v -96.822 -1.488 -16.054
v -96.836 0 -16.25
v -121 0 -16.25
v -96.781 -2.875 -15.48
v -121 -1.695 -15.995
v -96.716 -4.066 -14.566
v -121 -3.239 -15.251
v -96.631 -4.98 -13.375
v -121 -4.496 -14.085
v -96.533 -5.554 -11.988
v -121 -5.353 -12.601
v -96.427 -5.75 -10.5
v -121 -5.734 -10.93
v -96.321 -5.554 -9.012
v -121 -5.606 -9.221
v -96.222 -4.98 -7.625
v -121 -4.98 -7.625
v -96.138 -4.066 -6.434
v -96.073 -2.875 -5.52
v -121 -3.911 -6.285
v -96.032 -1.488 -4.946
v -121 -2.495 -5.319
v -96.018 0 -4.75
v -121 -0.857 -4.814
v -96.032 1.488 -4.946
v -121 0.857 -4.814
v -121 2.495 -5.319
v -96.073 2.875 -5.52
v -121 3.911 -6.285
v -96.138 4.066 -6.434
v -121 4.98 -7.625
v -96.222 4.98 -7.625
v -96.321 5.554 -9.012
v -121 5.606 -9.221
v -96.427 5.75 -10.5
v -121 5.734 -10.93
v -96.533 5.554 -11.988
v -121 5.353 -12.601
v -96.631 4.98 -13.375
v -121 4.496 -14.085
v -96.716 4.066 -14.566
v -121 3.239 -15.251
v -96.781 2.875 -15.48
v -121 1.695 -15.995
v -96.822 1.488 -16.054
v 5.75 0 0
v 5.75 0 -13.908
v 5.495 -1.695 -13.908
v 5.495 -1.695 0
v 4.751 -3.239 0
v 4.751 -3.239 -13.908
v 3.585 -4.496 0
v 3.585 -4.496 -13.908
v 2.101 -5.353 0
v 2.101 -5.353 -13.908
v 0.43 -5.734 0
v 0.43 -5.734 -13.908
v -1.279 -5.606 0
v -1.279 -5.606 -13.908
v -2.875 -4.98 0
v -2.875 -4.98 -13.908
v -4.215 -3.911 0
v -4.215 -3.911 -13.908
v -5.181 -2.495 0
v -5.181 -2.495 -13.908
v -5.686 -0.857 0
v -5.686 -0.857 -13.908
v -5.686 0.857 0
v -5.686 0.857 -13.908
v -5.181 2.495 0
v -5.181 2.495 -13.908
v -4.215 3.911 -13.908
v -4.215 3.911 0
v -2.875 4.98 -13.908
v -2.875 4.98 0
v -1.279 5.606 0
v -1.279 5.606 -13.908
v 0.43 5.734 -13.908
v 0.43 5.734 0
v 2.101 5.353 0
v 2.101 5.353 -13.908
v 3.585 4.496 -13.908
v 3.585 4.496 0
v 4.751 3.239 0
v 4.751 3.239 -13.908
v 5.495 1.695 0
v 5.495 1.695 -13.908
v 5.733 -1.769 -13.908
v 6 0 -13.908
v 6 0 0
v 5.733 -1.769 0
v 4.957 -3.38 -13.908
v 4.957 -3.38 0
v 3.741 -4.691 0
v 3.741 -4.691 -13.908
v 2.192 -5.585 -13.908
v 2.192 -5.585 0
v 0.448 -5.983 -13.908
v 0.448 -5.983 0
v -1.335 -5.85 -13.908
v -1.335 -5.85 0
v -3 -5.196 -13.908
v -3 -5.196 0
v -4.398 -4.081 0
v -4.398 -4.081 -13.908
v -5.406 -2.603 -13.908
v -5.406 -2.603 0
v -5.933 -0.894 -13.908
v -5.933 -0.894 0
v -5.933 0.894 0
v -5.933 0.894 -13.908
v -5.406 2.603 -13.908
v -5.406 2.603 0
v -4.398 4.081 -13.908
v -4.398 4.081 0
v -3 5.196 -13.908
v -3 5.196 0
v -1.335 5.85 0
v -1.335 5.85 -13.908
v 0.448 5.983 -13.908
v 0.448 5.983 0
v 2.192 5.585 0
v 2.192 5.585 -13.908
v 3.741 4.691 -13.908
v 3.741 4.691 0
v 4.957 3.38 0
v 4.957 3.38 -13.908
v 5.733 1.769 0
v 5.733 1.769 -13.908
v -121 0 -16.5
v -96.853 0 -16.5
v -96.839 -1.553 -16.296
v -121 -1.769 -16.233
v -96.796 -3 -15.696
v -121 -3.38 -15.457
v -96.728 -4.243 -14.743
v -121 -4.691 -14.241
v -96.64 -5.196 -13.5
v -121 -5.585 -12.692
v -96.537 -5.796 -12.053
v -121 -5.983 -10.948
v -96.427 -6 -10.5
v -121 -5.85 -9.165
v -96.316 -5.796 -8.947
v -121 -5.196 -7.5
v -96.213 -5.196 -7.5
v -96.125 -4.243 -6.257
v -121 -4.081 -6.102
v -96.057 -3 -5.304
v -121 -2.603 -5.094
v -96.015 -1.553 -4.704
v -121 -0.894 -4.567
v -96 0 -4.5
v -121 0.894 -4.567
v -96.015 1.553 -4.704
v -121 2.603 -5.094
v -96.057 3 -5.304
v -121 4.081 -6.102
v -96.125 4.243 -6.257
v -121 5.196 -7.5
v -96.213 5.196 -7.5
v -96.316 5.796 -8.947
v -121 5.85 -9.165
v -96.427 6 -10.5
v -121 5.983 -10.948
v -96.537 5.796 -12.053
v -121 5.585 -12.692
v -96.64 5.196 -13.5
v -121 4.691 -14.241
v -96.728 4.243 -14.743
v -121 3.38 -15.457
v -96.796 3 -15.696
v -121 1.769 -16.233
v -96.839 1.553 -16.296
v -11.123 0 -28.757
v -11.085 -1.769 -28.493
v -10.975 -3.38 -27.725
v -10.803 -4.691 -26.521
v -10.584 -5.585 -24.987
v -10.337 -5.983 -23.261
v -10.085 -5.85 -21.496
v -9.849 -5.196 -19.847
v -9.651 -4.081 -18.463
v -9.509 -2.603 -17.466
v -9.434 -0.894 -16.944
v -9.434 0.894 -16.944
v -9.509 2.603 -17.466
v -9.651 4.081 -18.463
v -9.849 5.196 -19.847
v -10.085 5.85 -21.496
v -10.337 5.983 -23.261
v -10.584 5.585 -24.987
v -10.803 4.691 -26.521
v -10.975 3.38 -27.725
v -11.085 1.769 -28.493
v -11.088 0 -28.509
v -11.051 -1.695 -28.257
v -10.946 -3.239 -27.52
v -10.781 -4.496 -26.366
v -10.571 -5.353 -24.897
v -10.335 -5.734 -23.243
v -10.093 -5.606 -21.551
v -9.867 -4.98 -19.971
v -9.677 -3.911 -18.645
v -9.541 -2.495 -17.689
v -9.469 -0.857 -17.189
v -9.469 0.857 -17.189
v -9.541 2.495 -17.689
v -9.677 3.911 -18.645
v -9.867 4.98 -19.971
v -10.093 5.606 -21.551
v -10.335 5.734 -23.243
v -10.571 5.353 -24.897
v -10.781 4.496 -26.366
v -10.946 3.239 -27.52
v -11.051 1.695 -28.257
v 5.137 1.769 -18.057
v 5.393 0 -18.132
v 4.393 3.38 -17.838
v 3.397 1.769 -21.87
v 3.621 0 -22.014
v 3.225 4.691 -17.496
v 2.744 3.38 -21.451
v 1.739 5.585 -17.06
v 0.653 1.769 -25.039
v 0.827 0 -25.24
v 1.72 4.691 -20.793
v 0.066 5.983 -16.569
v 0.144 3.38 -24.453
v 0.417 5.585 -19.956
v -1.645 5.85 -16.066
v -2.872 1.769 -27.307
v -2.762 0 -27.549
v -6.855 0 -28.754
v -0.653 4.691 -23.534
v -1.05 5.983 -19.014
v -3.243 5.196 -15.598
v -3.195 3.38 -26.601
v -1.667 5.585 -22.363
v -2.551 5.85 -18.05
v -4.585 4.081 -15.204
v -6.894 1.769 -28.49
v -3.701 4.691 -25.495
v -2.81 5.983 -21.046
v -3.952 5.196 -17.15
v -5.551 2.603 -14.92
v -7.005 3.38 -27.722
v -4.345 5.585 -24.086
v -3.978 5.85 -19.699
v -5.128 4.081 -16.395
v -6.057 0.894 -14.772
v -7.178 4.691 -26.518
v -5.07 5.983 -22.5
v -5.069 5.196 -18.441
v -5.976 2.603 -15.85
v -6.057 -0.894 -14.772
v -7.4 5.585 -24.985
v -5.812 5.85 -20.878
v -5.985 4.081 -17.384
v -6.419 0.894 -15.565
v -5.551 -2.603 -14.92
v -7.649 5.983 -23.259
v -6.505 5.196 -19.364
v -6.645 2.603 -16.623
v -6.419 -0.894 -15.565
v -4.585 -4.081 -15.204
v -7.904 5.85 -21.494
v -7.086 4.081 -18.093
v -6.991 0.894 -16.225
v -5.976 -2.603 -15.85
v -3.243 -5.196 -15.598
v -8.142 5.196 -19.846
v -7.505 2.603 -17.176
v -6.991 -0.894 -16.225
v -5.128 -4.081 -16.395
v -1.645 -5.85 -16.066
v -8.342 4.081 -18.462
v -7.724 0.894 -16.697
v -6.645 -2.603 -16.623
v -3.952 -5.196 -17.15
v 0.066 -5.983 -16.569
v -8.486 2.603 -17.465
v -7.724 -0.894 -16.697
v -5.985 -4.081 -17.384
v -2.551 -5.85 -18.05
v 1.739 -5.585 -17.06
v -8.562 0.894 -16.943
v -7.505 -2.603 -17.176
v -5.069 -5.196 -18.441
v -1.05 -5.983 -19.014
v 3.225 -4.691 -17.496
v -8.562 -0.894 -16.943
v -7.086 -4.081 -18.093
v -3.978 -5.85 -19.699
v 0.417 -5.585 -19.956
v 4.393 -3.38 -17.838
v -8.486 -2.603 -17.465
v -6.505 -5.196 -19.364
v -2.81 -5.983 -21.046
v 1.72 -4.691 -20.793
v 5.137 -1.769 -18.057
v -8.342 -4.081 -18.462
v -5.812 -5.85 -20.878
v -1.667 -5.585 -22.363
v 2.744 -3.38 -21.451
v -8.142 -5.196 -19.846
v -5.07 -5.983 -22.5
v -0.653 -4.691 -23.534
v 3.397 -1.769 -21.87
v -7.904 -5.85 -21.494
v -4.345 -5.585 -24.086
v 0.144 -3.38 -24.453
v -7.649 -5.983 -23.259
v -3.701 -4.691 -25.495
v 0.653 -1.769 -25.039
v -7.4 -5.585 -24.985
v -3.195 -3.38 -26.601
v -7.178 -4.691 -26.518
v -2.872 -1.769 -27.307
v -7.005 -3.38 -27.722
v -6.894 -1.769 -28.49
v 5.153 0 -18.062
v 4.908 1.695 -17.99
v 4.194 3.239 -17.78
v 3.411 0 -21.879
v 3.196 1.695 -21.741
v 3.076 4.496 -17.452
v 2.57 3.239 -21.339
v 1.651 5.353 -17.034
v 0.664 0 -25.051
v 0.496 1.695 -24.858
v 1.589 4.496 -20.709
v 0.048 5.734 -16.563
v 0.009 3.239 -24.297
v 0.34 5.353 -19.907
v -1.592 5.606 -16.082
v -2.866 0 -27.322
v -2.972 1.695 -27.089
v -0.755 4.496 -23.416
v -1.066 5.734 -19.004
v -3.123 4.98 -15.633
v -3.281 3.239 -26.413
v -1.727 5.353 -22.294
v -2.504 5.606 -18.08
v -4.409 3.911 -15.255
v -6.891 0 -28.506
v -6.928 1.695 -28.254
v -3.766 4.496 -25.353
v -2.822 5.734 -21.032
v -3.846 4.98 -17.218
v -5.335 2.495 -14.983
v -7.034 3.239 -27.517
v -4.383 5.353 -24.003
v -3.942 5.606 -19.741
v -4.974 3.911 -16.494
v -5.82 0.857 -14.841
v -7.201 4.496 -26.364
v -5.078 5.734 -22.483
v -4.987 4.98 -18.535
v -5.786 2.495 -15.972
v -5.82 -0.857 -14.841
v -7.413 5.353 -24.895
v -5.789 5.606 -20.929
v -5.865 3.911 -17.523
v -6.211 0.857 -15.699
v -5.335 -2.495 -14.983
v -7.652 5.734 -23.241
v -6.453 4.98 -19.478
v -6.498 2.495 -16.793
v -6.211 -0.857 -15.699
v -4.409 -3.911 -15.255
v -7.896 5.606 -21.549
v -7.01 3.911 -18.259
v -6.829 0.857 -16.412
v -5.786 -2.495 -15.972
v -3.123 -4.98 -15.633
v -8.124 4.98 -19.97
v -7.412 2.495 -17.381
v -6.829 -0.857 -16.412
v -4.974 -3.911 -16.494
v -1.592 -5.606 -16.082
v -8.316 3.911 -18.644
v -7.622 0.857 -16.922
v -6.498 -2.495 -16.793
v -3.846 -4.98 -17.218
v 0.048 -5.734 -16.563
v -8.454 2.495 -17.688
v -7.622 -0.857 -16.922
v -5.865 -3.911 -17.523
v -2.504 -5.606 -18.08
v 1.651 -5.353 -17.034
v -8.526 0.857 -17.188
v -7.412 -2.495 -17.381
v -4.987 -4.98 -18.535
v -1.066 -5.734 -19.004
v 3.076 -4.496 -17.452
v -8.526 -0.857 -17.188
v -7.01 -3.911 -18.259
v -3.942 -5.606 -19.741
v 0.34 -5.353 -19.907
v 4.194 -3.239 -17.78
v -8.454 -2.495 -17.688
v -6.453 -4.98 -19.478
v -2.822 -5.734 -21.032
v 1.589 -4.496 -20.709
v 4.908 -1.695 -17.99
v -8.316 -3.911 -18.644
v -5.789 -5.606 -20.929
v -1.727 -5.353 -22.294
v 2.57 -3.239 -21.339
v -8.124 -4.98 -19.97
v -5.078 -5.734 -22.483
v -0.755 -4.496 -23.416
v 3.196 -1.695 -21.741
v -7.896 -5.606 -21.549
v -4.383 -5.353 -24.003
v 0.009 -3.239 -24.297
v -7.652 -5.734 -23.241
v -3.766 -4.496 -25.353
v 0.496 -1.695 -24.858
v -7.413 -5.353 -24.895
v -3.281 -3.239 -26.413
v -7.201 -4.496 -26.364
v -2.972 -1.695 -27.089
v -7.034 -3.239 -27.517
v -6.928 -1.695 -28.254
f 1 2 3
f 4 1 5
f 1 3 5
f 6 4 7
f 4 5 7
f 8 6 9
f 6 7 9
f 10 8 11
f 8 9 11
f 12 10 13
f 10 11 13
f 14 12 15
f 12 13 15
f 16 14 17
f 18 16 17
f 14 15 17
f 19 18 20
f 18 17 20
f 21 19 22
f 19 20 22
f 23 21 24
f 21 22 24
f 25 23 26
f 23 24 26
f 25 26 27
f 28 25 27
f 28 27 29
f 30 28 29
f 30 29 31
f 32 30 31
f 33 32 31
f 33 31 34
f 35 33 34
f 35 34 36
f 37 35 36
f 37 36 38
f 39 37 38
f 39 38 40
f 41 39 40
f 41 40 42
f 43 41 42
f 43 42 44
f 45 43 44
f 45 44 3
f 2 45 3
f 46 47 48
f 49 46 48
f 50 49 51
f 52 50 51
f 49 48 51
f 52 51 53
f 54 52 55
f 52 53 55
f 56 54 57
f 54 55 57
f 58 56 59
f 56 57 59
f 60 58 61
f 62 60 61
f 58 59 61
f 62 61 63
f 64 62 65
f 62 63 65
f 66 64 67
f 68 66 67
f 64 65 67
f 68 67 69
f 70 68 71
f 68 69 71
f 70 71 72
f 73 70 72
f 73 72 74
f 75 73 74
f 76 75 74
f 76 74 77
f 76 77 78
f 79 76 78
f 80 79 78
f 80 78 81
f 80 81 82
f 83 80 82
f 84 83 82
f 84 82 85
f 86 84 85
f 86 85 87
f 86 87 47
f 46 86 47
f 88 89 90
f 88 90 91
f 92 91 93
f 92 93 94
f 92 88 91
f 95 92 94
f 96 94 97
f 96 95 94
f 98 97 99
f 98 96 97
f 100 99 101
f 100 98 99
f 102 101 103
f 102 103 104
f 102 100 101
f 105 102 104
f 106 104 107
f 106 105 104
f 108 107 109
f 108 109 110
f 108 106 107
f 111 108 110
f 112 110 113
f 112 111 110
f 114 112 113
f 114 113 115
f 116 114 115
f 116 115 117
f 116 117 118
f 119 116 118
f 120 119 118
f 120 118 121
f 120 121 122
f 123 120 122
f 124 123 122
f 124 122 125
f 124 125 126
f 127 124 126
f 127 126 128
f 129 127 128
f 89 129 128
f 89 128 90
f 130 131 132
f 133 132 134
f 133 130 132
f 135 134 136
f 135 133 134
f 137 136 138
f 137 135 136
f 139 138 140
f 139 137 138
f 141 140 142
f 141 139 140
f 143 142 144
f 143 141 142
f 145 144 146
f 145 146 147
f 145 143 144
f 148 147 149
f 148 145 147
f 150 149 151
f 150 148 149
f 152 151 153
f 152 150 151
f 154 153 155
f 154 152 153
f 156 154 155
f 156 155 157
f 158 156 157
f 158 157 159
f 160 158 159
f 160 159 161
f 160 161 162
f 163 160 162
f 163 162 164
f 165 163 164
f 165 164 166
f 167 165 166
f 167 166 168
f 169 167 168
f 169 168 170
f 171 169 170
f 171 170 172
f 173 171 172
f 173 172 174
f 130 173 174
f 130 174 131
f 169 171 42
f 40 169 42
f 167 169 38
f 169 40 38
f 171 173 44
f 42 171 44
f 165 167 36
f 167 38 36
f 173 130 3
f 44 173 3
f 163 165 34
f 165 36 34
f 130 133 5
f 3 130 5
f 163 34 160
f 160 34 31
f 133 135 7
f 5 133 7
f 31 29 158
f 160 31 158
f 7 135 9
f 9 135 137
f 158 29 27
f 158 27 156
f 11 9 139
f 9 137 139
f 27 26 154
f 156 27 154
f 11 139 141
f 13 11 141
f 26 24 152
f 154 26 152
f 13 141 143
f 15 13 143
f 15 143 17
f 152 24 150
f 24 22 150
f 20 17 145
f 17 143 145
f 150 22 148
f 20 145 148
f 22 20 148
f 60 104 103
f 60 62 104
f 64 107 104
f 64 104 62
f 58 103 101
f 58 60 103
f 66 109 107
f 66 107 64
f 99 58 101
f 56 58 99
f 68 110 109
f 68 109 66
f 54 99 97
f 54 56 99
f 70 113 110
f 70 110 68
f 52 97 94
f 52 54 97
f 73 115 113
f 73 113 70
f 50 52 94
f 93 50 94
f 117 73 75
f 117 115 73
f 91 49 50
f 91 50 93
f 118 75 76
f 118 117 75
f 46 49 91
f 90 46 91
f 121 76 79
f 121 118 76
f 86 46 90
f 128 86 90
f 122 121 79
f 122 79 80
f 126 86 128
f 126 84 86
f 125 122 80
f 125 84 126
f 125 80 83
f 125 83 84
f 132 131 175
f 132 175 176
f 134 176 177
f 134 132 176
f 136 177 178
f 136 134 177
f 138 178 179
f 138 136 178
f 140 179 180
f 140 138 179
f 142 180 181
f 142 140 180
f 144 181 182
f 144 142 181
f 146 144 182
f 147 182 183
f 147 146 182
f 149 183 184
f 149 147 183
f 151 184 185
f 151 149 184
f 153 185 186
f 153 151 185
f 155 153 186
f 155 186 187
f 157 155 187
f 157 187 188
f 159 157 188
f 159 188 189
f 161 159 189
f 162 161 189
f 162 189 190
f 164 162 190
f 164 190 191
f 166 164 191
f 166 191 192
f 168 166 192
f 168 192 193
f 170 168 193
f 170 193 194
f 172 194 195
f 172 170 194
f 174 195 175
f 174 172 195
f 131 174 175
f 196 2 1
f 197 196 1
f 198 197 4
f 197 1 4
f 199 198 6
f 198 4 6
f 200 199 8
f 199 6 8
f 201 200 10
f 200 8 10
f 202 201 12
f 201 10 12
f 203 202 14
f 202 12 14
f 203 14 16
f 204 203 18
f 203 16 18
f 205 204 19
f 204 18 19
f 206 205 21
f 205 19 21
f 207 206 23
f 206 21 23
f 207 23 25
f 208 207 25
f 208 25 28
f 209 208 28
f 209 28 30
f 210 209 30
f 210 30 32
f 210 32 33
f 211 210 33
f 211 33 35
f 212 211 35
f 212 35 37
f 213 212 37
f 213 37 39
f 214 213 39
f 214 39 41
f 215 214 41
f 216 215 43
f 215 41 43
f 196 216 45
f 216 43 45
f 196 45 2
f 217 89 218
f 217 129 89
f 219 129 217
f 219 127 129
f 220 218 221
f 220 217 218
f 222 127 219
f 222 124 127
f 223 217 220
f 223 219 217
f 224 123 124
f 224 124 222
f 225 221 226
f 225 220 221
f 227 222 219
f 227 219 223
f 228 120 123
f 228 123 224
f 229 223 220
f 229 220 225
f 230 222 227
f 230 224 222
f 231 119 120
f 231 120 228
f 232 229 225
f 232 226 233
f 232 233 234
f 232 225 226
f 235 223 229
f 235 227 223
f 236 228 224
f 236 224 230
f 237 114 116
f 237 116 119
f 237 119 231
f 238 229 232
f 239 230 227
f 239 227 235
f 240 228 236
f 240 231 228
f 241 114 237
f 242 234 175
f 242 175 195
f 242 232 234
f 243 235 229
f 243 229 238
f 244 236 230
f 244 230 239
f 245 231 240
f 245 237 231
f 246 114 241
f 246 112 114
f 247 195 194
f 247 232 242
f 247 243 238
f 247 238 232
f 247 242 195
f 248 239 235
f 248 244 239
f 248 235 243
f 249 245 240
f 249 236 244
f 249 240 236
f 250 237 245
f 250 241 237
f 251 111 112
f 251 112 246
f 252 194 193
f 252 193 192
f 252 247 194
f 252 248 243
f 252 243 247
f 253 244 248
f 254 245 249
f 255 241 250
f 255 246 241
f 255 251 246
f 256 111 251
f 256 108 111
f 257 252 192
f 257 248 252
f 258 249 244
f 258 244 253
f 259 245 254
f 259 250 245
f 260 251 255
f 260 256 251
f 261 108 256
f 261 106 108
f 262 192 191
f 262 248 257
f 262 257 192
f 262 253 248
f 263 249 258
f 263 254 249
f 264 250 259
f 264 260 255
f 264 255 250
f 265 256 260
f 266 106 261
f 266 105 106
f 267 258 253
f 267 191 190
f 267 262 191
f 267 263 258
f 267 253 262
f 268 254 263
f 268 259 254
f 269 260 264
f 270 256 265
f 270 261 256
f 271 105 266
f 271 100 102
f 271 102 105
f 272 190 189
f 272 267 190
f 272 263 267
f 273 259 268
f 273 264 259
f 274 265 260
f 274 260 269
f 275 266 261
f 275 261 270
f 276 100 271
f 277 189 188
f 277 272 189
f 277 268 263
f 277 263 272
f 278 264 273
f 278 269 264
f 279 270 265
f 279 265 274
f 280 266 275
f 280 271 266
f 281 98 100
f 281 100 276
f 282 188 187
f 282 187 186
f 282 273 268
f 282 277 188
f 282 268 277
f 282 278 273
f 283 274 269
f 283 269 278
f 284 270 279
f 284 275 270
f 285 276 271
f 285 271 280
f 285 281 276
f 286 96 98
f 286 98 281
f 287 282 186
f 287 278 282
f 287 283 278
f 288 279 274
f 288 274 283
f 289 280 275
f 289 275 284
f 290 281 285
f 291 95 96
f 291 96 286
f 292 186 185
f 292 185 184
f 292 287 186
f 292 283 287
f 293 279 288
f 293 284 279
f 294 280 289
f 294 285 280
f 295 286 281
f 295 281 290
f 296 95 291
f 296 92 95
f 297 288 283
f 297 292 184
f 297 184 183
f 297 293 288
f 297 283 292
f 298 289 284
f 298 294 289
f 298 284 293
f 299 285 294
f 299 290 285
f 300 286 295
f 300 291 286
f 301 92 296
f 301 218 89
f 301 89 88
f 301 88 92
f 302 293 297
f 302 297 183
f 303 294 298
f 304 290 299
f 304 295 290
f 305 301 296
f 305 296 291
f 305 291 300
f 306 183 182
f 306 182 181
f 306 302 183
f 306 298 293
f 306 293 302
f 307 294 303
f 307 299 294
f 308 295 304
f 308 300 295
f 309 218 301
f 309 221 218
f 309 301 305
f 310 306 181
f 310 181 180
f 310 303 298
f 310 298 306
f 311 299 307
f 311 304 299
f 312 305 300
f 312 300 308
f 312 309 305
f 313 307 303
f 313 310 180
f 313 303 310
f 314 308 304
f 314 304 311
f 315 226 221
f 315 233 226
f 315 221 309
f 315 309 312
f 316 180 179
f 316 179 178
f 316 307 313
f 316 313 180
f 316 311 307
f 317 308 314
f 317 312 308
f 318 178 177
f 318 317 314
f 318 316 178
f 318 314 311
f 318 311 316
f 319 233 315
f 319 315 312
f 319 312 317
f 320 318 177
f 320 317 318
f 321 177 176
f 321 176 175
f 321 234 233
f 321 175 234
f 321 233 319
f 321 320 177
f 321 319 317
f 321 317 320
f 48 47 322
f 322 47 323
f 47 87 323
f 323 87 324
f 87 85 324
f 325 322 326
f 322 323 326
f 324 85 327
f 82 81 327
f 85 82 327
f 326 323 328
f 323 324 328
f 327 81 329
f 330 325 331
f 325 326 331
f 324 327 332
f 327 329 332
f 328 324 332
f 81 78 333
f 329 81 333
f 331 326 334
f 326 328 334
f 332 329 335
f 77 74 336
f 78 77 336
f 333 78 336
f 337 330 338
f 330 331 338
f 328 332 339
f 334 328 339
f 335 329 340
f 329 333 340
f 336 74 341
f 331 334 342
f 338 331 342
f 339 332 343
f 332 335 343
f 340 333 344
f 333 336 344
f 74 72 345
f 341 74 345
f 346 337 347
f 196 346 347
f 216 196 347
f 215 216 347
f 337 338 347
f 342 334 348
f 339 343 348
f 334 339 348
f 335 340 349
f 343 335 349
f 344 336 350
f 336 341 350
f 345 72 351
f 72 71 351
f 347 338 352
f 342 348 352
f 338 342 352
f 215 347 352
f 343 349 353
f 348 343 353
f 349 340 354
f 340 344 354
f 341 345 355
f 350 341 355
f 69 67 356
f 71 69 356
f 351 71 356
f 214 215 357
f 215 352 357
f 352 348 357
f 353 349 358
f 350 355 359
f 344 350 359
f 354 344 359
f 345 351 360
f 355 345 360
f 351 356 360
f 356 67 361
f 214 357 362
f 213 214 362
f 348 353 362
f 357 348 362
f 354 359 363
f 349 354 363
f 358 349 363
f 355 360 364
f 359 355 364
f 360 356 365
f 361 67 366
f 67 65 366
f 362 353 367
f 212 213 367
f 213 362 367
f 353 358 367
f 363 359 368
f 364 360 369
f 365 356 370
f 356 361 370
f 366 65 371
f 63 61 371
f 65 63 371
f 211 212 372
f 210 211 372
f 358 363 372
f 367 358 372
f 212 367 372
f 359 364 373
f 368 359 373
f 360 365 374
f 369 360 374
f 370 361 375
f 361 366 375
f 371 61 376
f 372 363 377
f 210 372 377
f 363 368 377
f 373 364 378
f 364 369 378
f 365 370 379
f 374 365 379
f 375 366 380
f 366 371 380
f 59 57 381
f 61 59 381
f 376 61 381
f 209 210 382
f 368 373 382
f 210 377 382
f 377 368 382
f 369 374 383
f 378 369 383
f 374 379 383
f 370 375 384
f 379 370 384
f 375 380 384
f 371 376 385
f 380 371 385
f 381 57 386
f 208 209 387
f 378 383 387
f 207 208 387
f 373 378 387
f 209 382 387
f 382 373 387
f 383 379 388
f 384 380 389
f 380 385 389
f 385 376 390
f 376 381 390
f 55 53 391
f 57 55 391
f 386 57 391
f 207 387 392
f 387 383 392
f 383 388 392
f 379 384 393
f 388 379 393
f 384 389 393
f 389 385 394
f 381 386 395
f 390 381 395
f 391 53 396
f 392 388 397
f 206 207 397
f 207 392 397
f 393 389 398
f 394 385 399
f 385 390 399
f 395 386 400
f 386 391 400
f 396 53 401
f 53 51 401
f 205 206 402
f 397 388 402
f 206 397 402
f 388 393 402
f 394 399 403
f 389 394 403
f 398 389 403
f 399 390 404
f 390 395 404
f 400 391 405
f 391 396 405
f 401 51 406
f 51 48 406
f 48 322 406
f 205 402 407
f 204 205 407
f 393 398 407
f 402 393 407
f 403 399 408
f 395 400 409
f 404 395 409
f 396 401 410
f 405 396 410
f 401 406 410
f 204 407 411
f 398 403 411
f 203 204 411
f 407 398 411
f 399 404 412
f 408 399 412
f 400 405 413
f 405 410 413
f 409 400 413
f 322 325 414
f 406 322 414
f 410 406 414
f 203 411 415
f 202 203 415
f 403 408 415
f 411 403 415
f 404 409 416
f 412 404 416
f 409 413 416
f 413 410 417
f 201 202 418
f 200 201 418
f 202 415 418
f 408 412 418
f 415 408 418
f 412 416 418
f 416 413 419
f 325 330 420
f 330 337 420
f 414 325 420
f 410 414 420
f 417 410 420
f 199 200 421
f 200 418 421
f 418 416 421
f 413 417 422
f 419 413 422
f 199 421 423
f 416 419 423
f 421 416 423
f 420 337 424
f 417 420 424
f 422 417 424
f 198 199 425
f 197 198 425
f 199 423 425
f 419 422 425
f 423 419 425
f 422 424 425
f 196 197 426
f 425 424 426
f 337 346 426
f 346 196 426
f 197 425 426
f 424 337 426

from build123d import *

# Parameters (mm, degrees)
F0_R   = 6
F0_R_2 = 5.75


with BuildPart() as f2:
    # F2: sweep along a path in F1
    with BuildLine(Plane.XZ) as f2_path:
        Line((-6, 0), (-6, -13.9078725958))
        ThreePointArc((-6, -13.9078725958), (-7.0345199545, -16.1743430215), (-9.4245921271, -16.8776741928))
        Line((-9.4245921271, -16.8776741928), (-96, -4.5))
        Line((-96, -4.5), (-121, -4.5))
    # F0 (on Top) → F2 (sweep)
    with BuildSketch(Plane.XY):
        Circle(F0_R)
        Circle(F0_R_2, mode=Mode.SUBTRACT)
    sweep(path=f2_path.line, transition=Transition.RIGHT)


solid = f2.part
